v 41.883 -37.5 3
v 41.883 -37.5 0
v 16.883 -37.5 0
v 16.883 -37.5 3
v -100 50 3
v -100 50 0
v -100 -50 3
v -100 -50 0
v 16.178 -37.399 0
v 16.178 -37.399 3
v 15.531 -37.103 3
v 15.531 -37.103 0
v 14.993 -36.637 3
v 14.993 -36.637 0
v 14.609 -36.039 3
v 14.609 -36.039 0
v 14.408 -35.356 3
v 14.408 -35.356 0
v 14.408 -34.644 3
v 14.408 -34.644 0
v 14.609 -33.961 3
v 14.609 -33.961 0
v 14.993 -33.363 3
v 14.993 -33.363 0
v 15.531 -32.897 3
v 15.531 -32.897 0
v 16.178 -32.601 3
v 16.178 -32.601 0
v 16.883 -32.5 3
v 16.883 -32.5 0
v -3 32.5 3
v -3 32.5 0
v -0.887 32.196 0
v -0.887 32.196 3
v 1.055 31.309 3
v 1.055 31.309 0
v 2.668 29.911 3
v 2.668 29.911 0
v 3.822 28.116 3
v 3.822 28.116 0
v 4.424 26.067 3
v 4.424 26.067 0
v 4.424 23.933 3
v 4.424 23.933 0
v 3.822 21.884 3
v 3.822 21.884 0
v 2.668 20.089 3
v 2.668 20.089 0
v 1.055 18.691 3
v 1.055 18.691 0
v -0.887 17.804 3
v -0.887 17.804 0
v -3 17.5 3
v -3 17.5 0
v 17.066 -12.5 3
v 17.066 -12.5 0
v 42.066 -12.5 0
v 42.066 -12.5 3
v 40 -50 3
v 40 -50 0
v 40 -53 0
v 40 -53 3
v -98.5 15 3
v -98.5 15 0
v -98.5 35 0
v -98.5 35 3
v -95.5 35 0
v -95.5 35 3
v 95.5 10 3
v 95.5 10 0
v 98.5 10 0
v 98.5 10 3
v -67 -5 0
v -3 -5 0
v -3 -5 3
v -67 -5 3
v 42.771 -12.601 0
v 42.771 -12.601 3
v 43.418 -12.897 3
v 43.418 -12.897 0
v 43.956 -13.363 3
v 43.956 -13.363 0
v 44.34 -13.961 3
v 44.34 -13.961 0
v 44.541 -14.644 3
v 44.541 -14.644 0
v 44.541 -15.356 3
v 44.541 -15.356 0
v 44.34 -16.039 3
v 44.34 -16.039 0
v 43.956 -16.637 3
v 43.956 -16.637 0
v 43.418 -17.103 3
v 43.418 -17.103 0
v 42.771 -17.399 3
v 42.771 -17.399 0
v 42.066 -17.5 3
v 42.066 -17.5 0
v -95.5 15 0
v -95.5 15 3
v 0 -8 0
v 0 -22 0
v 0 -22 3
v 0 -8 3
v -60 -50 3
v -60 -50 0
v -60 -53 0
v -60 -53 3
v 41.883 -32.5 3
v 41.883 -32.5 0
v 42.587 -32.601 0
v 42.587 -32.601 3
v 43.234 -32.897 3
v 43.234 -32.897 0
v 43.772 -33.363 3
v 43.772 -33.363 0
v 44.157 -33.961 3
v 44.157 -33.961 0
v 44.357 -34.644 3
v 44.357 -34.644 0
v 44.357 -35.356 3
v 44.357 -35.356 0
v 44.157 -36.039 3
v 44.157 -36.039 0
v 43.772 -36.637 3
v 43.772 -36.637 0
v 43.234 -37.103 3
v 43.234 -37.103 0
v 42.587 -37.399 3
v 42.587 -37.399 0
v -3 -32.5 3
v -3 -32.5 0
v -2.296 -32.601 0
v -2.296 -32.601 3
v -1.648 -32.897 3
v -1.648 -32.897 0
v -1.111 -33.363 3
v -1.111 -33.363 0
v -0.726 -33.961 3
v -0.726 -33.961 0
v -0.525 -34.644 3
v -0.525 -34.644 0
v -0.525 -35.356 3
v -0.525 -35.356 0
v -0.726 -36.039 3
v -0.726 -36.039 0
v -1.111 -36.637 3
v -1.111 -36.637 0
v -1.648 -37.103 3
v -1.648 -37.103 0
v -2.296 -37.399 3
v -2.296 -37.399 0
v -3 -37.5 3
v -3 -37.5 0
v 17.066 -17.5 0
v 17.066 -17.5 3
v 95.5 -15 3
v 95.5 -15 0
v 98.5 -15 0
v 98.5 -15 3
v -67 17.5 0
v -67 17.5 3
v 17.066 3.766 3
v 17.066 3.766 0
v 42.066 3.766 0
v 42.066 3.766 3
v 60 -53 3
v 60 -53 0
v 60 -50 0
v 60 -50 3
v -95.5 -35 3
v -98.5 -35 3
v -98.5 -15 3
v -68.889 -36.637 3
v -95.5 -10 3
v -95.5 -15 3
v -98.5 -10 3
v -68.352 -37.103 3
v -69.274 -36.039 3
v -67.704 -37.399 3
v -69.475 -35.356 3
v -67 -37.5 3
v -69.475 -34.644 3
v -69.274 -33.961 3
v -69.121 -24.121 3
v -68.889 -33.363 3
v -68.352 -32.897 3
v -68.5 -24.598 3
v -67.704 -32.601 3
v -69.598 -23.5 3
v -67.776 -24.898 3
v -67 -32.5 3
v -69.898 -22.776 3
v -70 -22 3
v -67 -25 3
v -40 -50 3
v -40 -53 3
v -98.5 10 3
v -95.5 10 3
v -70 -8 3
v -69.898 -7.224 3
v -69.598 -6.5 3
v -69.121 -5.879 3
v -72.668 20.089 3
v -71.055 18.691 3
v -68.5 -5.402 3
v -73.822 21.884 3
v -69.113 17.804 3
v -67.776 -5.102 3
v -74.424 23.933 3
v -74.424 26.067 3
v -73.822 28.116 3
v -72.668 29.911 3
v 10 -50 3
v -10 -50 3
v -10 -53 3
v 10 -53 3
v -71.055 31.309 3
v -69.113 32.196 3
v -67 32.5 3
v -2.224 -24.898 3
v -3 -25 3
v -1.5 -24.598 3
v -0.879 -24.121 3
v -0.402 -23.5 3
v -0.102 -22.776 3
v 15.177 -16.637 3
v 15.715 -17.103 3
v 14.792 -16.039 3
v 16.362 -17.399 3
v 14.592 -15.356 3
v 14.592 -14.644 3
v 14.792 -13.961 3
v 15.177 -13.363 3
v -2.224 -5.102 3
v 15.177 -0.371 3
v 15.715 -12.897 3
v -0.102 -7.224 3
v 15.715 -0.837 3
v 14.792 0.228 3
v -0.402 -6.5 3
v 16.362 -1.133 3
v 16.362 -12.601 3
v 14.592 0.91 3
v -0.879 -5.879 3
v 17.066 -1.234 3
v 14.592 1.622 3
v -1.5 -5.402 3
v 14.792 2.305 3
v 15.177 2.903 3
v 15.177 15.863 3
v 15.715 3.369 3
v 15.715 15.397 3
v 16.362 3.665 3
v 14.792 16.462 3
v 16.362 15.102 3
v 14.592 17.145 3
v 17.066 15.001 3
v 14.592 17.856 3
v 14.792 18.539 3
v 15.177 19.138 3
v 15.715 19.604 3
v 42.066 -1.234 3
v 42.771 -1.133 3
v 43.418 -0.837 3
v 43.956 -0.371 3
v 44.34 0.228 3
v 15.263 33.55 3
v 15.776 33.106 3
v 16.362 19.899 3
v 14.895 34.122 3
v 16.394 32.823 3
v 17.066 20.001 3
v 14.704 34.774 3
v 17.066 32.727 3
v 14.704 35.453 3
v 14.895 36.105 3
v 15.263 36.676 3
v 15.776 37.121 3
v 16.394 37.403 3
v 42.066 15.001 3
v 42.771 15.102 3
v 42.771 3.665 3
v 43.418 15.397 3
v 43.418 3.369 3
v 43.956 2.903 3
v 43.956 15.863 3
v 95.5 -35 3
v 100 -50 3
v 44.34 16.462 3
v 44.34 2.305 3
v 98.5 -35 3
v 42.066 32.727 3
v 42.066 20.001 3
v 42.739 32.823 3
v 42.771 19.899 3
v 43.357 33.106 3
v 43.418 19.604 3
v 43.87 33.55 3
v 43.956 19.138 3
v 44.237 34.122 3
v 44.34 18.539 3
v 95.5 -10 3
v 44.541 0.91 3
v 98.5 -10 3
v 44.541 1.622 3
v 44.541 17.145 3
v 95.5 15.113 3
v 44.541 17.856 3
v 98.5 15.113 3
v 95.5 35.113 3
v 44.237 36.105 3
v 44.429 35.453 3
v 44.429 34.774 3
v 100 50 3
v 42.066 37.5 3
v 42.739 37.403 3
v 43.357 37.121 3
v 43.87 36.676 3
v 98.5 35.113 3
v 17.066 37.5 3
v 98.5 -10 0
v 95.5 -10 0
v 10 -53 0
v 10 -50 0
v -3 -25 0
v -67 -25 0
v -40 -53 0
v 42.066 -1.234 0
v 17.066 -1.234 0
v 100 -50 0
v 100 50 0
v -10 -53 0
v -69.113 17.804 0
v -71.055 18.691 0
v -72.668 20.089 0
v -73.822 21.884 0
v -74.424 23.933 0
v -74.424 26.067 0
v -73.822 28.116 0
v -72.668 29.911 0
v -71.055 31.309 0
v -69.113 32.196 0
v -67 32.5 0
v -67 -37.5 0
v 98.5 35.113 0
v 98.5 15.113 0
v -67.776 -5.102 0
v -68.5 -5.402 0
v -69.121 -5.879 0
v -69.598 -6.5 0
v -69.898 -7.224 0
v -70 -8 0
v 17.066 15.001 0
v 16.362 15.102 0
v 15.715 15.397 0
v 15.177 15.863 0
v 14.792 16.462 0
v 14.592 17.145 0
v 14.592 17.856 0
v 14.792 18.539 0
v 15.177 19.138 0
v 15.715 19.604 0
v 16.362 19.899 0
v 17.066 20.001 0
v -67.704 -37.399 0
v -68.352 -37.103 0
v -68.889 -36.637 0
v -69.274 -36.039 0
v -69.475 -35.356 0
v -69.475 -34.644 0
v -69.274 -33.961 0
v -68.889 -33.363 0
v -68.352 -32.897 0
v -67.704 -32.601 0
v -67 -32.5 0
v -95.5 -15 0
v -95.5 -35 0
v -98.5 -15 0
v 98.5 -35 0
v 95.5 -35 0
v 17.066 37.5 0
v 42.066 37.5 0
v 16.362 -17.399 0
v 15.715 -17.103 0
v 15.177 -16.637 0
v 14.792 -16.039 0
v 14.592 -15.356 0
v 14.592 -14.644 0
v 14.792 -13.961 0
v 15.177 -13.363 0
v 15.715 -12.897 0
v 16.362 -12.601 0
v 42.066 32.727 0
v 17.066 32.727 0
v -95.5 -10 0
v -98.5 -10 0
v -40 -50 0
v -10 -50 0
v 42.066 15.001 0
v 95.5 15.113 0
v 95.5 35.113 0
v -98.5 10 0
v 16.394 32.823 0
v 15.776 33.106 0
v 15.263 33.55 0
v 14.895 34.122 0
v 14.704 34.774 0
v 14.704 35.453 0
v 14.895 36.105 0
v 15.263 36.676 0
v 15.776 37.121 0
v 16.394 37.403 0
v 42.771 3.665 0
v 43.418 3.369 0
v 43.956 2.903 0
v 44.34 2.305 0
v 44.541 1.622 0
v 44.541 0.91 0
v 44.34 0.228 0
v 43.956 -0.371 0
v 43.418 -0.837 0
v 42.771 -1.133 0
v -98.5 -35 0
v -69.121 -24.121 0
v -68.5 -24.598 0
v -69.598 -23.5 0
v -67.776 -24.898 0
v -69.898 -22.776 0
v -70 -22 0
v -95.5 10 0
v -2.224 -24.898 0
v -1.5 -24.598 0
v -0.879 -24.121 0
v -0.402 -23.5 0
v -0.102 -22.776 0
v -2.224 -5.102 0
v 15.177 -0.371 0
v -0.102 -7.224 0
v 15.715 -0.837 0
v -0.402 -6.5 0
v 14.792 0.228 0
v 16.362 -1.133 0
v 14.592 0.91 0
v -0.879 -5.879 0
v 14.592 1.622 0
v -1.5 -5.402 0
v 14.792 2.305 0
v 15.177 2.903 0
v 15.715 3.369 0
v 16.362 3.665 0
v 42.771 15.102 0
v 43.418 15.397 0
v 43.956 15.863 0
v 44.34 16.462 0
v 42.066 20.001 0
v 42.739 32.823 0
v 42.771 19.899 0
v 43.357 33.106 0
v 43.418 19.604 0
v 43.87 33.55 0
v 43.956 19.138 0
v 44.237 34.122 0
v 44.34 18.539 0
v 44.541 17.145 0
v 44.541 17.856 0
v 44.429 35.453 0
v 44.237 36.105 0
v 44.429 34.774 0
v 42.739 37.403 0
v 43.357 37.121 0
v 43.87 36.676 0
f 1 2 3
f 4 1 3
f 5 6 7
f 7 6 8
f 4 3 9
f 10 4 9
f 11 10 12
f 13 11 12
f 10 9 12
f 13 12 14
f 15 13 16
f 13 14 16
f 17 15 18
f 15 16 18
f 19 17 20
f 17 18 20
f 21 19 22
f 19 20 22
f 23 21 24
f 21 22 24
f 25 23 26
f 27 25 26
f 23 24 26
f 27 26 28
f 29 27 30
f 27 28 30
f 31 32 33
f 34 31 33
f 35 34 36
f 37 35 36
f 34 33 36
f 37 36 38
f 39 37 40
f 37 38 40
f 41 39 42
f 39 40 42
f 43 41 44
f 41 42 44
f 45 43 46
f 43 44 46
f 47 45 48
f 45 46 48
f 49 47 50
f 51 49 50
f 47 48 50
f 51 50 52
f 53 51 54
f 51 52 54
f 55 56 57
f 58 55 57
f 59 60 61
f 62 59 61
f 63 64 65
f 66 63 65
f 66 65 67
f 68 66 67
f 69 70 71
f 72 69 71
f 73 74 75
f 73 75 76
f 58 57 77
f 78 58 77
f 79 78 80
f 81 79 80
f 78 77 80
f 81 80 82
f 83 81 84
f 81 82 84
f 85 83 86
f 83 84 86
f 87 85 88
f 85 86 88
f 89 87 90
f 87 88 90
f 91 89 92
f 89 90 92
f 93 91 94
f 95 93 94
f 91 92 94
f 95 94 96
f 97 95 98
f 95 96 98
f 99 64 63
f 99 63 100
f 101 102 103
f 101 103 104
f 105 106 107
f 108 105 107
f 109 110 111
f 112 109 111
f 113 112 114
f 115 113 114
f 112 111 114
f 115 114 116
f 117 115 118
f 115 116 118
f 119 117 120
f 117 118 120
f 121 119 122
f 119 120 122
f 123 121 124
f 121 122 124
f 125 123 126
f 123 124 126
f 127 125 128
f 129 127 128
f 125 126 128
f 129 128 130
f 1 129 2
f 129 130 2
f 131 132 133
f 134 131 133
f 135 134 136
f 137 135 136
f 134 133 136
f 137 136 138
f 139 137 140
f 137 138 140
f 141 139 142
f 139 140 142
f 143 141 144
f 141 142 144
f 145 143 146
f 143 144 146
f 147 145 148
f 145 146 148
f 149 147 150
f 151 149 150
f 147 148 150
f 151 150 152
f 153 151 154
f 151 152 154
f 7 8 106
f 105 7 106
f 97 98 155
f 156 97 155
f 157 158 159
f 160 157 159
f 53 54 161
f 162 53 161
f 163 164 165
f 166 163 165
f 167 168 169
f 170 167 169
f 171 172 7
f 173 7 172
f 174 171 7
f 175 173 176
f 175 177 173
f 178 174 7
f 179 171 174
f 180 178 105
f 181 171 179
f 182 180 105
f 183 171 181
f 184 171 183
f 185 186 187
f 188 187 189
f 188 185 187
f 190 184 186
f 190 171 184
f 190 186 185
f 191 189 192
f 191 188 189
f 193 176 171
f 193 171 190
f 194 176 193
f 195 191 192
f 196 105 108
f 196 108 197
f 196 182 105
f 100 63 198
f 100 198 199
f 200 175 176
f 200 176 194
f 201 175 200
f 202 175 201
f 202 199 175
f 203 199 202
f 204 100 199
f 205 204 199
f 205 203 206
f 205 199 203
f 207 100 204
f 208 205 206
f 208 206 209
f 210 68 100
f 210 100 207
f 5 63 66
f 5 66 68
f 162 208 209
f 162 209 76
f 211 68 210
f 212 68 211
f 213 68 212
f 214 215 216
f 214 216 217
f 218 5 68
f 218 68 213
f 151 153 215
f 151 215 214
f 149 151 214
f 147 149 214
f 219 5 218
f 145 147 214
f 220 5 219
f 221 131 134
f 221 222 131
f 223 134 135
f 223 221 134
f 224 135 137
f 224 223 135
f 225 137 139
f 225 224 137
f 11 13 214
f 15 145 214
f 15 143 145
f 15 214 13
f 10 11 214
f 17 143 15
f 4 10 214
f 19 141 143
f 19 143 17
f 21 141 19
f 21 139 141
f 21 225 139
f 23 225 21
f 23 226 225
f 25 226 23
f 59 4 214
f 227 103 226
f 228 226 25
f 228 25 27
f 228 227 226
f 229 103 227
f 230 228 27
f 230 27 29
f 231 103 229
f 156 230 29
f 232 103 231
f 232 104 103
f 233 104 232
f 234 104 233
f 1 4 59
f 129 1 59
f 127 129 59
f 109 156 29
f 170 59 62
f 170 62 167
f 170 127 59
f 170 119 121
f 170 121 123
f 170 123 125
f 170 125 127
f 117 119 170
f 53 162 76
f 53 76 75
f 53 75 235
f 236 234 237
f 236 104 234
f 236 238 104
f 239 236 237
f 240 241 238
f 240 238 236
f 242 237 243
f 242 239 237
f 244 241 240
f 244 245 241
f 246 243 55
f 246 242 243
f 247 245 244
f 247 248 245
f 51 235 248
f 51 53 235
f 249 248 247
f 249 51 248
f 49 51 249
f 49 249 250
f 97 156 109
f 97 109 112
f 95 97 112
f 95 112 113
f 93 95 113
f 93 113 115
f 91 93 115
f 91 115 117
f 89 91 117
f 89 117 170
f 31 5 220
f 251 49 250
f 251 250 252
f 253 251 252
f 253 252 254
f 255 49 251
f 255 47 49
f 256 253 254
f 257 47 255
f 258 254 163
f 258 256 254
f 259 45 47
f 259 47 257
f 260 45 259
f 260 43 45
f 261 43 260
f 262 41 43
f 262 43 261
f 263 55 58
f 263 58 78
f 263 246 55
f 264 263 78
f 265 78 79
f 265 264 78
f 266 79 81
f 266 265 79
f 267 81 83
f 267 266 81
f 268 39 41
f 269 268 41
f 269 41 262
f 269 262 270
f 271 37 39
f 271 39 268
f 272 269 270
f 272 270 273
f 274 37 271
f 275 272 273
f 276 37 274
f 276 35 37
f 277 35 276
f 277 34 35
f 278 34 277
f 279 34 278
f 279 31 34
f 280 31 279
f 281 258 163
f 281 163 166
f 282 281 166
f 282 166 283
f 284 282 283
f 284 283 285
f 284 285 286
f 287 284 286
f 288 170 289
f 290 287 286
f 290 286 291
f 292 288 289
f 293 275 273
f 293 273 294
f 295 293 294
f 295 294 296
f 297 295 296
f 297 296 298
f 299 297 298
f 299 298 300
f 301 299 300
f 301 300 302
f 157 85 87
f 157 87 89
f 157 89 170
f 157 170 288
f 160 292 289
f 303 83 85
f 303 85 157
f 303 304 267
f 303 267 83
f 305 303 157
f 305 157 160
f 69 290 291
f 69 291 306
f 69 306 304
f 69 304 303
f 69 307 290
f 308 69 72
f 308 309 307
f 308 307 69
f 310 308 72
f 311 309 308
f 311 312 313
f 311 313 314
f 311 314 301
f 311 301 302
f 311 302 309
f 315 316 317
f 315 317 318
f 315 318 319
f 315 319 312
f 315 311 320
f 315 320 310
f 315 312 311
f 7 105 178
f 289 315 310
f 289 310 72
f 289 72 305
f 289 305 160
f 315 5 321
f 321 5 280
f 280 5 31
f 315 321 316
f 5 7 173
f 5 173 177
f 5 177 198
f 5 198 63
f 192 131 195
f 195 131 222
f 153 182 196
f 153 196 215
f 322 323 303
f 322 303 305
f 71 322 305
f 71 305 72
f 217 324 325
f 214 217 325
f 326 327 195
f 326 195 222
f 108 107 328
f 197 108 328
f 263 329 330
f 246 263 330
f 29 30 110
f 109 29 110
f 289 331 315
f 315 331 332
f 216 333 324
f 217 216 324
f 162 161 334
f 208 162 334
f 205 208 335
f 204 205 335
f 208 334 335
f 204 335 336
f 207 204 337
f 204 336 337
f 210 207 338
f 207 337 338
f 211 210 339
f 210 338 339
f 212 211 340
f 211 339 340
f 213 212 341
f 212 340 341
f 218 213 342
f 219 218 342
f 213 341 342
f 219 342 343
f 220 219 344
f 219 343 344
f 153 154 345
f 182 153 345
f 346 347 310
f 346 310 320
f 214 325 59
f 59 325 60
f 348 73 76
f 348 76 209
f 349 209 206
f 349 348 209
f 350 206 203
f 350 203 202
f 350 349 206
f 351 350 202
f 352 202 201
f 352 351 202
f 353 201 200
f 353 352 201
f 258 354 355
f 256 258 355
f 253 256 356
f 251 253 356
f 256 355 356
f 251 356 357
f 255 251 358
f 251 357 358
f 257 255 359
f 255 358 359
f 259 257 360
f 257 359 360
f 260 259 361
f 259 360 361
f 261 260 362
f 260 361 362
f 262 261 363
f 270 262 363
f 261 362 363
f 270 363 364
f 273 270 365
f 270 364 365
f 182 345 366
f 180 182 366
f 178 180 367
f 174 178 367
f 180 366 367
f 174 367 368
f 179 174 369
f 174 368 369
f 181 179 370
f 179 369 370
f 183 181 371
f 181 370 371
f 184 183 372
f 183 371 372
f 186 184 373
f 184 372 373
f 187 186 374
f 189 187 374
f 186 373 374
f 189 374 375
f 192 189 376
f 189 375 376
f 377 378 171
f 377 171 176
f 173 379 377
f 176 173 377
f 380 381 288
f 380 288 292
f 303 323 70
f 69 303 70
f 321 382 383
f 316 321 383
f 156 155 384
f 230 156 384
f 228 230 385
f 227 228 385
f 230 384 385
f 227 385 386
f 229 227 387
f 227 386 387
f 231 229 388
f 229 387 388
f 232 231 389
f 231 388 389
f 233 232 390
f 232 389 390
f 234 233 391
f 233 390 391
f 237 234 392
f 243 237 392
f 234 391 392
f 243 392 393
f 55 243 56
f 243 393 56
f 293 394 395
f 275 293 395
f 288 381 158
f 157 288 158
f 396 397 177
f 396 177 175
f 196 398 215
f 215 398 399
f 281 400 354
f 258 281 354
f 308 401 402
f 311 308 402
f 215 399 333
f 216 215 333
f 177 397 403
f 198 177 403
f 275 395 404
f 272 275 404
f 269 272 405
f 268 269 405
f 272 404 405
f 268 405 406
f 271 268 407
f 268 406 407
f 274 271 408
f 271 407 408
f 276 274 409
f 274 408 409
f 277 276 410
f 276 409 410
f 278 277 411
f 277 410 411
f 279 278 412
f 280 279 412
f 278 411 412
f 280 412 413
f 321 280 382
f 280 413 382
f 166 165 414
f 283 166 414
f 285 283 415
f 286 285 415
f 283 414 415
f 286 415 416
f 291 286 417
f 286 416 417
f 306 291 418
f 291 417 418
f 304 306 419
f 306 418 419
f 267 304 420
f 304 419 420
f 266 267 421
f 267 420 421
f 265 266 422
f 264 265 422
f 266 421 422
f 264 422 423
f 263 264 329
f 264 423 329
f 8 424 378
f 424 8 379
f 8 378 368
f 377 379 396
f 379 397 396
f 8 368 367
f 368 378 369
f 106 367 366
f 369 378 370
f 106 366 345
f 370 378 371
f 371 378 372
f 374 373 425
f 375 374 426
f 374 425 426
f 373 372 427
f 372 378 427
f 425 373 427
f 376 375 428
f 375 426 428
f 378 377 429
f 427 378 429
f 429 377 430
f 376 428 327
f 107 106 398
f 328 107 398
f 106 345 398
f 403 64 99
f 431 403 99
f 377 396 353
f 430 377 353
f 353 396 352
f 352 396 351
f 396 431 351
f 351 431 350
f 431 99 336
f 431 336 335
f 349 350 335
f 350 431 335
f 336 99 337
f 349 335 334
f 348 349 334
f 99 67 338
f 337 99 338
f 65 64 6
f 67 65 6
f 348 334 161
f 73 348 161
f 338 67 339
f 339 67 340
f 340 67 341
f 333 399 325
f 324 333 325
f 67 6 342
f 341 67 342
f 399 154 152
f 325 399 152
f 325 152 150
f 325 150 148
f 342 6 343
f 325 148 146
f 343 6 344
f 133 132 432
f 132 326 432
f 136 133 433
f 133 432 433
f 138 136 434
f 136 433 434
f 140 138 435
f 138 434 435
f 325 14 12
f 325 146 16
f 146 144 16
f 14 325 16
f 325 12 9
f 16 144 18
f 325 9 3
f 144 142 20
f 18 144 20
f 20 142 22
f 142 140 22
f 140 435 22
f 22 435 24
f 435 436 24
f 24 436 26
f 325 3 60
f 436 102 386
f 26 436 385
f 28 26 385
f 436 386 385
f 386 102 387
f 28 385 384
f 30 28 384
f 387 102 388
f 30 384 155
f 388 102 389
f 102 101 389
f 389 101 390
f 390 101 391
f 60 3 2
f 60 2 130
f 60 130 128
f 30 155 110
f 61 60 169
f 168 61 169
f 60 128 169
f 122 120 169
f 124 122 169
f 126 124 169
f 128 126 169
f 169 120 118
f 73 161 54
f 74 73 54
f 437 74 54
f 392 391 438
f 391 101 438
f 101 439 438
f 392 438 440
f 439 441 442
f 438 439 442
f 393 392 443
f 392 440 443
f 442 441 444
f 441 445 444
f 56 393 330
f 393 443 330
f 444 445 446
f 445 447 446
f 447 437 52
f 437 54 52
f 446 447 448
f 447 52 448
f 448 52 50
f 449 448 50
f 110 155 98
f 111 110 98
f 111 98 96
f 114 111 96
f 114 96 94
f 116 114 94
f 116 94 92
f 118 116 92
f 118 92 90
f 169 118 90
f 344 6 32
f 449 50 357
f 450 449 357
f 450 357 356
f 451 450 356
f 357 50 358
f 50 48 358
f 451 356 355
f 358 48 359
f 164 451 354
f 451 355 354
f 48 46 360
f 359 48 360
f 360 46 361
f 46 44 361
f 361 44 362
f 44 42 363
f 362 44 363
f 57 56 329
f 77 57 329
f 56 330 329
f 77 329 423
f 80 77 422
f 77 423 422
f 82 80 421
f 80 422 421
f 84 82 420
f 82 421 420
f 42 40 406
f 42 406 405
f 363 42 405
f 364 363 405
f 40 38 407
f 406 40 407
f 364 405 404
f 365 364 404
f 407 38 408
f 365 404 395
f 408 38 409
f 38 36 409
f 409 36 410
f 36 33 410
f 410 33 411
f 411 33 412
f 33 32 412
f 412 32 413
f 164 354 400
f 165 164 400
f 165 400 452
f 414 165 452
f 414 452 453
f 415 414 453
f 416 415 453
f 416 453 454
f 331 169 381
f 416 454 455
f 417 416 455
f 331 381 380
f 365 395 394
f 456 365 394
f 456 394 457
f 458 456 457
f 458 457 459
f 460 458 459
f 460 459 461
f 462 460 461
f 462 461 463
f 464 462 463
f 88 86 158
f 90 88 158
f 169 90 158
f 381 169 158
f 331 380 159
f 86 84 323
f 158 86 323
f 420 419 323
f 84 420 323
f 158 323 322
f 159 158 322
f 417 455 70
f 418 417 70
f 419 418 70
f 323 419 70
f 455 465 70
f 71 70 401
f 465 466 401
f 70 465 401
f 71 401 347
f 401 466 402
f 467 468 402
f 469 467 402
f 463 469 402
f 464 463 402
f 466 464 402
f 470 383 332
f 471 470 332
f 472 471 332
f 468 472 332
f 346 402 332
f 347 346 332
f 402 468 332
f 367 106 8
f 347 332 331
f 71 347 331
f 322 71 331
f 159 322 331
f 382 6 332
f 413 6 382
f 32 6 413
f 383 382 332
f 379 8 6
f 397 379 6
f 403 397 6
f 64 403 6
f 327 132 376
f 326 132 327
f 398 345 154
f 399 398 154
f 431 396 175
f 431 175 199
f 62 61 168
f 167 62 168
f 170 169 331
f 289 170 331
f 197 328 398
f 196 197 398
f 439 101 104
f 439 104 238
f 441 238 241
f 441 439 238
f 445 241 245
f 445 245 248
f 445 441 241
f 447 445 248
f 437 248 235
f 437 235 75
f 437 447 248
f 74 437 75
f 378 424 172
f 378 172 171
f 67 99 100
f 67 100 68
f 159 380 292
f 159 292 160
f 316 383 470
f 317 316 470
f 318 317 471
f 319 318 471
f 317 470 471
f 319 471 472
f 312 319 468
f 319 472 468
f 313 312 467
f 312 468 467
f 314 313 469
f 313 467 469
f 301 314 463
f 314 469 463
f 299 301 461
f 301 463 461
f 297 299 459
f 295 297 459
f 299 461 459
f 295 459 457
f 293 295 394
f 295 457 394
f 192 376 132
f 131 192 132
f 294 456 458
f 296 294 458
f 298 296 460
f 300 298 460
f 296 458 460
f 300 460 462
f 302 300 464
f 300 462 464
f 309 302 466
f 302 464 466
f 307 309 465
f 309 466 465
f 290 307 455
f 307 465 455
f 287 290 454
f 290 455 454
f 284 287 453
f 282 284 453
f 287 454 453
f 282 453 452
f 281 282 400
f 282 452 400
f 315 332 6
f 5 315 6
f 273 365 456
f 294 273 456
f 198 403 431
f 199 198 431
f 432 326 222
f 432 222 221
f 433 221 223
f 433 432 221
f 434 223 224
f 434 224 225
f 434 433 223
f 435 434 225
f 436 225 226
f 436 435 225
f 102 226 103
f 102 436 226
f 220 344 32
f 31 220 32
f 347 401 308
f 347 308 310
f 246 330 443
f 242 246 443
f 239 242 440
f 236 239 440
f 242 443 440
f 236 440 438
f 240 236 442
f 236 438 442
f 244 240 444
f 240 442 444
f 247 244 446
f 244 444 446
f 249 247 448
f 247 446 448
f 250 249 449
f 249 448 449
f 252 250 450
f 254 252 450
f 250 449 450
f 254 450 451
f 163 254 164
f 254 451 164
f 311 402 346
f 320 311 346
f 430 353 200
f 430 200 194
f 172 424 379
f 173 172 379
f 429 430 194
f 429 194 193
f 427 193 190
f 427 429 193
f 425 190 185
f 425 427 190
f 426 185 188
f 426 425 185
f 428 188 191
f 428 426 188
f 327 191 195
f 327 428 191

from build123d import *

# Parameters (mm, degrees)
SKETCH1_W           = 3
SKETCH1_H           = 20
BOSS_EXTRUDE1_DEPTH = 3


with BuildPart() as part:
    # Sketch1 → Boss-Extrude1 (new body)
    with BuildSketch(Plane.XY):
        Polygon((-100, -50), (-60, -50), (-60, -53), (-40, -53), (-40, -50), (-10, -50), (-10, -53), (10, -53), (10, -50), (40, -50), (40, -53), (60, -53), (60, -50), (100, -50), (100, 50), (-100, 50), align=None)
        with BuildLine():
            Line((-67, -25), (-3, -25))
            ThreePointArc((-3, -25), (-0.878679656, -24.121320344), (0, -22))
            Line((0, -22), (0, -8))
            ThreePointArc((0, -8), (-0.878679656, -5.878679656), (-3, -5))
            Line((-3, -5), (-67, -5))
            ThreePointArc((-67, -5), (-69.121320344, -5.878679656), (-70, -8))
            Line((-70, -8), (-70, -22))
            ThreePointArc((-70, -22), (-69.121320344, -24.121320344), (-67, -25))
        make_face(mode=Mode.SUBTRACT)
        with Locations((-97, 25)):
            Rectangle(SKETCH1_W, SKETCH1_H, mode=Mode.SUBTRACT)
        with Locations((-97, 0)):
            Rectangle(SKETCH1_W, SKETCH1_H, mode=Mode.SUBTRACT)
        with Locations((-97, -25)):
            Rectangle(SKETCH1_W, SKETCH1_H, mode=Mode.SUBTRACT)
        with Locations((97, 25.11339046)):
            Rectangle(SKETCH1_W, SKETCH1_H, mode=Mode.SUBTRACT)
        with Locations((97, 0)):
            Rectangle(SKETCH1_W, SKETCH1_H, mode=Mode.SUBTRACT)
        with Locations((97, -25)):
            Rectangle(SKETCH1_W, SKETCH1_H, mode=Mode.SUBTRACT)
        with BuildLine():
            Line((17.066389082, 37.5), (42.066389082, 37.5))
            ThreePointArc((42.066389082, 37.5), (44.452998622, 35.11339046), (42.066389082, 32.72678092))
            Line((42.066389082, 32.72678092), (17.066389082, 32.72678092))
            ThreePointArc((17.066389082, 32.72678092), (14.679779542, 35.11339046), (17.066389082, 37.5))
        make_face(mode=Mode.SUBTRACT)
        with BuildLine():
            Line((17.066389082, 20.00057963), (42.066389082, 20.00057963))
            ThreePointArc((42.066389082, 20.00057963), (44.566389082, 17.50057963), (42.066389082, 15.00057963))
            Line((42.066389082, 15.00057963), (17.066389082, 15.00057963))
            ThreePointArc((17.066389082, 15.00057963), (14.566389082, 17.50057963), (17.066389082, 20.00057963))
        make_face(mode=Mode.SUBTRACT)
        with BuildLine():
            Line((17.066389082, 3.766162691), (42.066389082, 3.766162691))
            ThreePointArc((42.066389082, 3.766162691), (44.566389082, 1.266162691), (42.066389082, -1.233837309))
            Line((42.066389082, -1.233837309), (17.066389082, -1.233837309))
            ThreePointArc((17.066389082, -1.233837309), (14.566389082, 1.266162691), (17.066389082, 3.766162691))
        make_face(mode=Mode.SUBTRACT)
        with BuildLine():
            Line((16.882588886, -32.5), (41.882588886, -32.5))
            ThreePointArc((41.882588886, -32.5), (44.382588886, -35), (41.882588886, -37.5))
            Line((41.882588886, -37.5), (16.882588886, -37.5))
            ThreePointArc((16.882588886, -37.5), (14.382588886, -35), (16.882588886, -32.5))
        make_face(mode=Mode.SUBTRACT)
        with BuildLine():
            Line((17.066389082, -12.5), (42.066389082, -12.5))
            ThreePointArc((42.066389082, -12.5), (44.566389082, -15), (42.066389082, -17.5))
            Line((42.066389082, -17.5), (17.066389082, -17.5))
            ThreePointArc((17.066389082, -17.5), (14.566389082, -15), (17.066389082, -12.5))
        make_face(mode=Mode.SUBTRACT)
        with BuildLine():
            Line((-67, 32.5), (-3, 32.5))
            ThreePointArc((-3, 32.5), (4.5, 25), (-3, 17.5))
            Line((-3, 17.5), (-67, 17.5))
            ThreePointArc((-67, 17.5), (-74.5, 25), (-67, 32.5))
        make_face(mode=Mode.SUBTRACT)
        with BuildLine():
            Line((-67, -32.5), (-3, -32.5))
            ThreePointArc((-3, -32.5), (-0.5, -35), (-3, -37.5))
            Line((-3, -37.5), (-67, -37.5))
            ThreePointArc((-67, -37.5), (-69.5, -35), (-67, -32.5))
        make_face(mode=Mode.SUBTRACT)
    extrude(amount=BOSS_EXTRUDE1_DEPTH)


solid = part.part
